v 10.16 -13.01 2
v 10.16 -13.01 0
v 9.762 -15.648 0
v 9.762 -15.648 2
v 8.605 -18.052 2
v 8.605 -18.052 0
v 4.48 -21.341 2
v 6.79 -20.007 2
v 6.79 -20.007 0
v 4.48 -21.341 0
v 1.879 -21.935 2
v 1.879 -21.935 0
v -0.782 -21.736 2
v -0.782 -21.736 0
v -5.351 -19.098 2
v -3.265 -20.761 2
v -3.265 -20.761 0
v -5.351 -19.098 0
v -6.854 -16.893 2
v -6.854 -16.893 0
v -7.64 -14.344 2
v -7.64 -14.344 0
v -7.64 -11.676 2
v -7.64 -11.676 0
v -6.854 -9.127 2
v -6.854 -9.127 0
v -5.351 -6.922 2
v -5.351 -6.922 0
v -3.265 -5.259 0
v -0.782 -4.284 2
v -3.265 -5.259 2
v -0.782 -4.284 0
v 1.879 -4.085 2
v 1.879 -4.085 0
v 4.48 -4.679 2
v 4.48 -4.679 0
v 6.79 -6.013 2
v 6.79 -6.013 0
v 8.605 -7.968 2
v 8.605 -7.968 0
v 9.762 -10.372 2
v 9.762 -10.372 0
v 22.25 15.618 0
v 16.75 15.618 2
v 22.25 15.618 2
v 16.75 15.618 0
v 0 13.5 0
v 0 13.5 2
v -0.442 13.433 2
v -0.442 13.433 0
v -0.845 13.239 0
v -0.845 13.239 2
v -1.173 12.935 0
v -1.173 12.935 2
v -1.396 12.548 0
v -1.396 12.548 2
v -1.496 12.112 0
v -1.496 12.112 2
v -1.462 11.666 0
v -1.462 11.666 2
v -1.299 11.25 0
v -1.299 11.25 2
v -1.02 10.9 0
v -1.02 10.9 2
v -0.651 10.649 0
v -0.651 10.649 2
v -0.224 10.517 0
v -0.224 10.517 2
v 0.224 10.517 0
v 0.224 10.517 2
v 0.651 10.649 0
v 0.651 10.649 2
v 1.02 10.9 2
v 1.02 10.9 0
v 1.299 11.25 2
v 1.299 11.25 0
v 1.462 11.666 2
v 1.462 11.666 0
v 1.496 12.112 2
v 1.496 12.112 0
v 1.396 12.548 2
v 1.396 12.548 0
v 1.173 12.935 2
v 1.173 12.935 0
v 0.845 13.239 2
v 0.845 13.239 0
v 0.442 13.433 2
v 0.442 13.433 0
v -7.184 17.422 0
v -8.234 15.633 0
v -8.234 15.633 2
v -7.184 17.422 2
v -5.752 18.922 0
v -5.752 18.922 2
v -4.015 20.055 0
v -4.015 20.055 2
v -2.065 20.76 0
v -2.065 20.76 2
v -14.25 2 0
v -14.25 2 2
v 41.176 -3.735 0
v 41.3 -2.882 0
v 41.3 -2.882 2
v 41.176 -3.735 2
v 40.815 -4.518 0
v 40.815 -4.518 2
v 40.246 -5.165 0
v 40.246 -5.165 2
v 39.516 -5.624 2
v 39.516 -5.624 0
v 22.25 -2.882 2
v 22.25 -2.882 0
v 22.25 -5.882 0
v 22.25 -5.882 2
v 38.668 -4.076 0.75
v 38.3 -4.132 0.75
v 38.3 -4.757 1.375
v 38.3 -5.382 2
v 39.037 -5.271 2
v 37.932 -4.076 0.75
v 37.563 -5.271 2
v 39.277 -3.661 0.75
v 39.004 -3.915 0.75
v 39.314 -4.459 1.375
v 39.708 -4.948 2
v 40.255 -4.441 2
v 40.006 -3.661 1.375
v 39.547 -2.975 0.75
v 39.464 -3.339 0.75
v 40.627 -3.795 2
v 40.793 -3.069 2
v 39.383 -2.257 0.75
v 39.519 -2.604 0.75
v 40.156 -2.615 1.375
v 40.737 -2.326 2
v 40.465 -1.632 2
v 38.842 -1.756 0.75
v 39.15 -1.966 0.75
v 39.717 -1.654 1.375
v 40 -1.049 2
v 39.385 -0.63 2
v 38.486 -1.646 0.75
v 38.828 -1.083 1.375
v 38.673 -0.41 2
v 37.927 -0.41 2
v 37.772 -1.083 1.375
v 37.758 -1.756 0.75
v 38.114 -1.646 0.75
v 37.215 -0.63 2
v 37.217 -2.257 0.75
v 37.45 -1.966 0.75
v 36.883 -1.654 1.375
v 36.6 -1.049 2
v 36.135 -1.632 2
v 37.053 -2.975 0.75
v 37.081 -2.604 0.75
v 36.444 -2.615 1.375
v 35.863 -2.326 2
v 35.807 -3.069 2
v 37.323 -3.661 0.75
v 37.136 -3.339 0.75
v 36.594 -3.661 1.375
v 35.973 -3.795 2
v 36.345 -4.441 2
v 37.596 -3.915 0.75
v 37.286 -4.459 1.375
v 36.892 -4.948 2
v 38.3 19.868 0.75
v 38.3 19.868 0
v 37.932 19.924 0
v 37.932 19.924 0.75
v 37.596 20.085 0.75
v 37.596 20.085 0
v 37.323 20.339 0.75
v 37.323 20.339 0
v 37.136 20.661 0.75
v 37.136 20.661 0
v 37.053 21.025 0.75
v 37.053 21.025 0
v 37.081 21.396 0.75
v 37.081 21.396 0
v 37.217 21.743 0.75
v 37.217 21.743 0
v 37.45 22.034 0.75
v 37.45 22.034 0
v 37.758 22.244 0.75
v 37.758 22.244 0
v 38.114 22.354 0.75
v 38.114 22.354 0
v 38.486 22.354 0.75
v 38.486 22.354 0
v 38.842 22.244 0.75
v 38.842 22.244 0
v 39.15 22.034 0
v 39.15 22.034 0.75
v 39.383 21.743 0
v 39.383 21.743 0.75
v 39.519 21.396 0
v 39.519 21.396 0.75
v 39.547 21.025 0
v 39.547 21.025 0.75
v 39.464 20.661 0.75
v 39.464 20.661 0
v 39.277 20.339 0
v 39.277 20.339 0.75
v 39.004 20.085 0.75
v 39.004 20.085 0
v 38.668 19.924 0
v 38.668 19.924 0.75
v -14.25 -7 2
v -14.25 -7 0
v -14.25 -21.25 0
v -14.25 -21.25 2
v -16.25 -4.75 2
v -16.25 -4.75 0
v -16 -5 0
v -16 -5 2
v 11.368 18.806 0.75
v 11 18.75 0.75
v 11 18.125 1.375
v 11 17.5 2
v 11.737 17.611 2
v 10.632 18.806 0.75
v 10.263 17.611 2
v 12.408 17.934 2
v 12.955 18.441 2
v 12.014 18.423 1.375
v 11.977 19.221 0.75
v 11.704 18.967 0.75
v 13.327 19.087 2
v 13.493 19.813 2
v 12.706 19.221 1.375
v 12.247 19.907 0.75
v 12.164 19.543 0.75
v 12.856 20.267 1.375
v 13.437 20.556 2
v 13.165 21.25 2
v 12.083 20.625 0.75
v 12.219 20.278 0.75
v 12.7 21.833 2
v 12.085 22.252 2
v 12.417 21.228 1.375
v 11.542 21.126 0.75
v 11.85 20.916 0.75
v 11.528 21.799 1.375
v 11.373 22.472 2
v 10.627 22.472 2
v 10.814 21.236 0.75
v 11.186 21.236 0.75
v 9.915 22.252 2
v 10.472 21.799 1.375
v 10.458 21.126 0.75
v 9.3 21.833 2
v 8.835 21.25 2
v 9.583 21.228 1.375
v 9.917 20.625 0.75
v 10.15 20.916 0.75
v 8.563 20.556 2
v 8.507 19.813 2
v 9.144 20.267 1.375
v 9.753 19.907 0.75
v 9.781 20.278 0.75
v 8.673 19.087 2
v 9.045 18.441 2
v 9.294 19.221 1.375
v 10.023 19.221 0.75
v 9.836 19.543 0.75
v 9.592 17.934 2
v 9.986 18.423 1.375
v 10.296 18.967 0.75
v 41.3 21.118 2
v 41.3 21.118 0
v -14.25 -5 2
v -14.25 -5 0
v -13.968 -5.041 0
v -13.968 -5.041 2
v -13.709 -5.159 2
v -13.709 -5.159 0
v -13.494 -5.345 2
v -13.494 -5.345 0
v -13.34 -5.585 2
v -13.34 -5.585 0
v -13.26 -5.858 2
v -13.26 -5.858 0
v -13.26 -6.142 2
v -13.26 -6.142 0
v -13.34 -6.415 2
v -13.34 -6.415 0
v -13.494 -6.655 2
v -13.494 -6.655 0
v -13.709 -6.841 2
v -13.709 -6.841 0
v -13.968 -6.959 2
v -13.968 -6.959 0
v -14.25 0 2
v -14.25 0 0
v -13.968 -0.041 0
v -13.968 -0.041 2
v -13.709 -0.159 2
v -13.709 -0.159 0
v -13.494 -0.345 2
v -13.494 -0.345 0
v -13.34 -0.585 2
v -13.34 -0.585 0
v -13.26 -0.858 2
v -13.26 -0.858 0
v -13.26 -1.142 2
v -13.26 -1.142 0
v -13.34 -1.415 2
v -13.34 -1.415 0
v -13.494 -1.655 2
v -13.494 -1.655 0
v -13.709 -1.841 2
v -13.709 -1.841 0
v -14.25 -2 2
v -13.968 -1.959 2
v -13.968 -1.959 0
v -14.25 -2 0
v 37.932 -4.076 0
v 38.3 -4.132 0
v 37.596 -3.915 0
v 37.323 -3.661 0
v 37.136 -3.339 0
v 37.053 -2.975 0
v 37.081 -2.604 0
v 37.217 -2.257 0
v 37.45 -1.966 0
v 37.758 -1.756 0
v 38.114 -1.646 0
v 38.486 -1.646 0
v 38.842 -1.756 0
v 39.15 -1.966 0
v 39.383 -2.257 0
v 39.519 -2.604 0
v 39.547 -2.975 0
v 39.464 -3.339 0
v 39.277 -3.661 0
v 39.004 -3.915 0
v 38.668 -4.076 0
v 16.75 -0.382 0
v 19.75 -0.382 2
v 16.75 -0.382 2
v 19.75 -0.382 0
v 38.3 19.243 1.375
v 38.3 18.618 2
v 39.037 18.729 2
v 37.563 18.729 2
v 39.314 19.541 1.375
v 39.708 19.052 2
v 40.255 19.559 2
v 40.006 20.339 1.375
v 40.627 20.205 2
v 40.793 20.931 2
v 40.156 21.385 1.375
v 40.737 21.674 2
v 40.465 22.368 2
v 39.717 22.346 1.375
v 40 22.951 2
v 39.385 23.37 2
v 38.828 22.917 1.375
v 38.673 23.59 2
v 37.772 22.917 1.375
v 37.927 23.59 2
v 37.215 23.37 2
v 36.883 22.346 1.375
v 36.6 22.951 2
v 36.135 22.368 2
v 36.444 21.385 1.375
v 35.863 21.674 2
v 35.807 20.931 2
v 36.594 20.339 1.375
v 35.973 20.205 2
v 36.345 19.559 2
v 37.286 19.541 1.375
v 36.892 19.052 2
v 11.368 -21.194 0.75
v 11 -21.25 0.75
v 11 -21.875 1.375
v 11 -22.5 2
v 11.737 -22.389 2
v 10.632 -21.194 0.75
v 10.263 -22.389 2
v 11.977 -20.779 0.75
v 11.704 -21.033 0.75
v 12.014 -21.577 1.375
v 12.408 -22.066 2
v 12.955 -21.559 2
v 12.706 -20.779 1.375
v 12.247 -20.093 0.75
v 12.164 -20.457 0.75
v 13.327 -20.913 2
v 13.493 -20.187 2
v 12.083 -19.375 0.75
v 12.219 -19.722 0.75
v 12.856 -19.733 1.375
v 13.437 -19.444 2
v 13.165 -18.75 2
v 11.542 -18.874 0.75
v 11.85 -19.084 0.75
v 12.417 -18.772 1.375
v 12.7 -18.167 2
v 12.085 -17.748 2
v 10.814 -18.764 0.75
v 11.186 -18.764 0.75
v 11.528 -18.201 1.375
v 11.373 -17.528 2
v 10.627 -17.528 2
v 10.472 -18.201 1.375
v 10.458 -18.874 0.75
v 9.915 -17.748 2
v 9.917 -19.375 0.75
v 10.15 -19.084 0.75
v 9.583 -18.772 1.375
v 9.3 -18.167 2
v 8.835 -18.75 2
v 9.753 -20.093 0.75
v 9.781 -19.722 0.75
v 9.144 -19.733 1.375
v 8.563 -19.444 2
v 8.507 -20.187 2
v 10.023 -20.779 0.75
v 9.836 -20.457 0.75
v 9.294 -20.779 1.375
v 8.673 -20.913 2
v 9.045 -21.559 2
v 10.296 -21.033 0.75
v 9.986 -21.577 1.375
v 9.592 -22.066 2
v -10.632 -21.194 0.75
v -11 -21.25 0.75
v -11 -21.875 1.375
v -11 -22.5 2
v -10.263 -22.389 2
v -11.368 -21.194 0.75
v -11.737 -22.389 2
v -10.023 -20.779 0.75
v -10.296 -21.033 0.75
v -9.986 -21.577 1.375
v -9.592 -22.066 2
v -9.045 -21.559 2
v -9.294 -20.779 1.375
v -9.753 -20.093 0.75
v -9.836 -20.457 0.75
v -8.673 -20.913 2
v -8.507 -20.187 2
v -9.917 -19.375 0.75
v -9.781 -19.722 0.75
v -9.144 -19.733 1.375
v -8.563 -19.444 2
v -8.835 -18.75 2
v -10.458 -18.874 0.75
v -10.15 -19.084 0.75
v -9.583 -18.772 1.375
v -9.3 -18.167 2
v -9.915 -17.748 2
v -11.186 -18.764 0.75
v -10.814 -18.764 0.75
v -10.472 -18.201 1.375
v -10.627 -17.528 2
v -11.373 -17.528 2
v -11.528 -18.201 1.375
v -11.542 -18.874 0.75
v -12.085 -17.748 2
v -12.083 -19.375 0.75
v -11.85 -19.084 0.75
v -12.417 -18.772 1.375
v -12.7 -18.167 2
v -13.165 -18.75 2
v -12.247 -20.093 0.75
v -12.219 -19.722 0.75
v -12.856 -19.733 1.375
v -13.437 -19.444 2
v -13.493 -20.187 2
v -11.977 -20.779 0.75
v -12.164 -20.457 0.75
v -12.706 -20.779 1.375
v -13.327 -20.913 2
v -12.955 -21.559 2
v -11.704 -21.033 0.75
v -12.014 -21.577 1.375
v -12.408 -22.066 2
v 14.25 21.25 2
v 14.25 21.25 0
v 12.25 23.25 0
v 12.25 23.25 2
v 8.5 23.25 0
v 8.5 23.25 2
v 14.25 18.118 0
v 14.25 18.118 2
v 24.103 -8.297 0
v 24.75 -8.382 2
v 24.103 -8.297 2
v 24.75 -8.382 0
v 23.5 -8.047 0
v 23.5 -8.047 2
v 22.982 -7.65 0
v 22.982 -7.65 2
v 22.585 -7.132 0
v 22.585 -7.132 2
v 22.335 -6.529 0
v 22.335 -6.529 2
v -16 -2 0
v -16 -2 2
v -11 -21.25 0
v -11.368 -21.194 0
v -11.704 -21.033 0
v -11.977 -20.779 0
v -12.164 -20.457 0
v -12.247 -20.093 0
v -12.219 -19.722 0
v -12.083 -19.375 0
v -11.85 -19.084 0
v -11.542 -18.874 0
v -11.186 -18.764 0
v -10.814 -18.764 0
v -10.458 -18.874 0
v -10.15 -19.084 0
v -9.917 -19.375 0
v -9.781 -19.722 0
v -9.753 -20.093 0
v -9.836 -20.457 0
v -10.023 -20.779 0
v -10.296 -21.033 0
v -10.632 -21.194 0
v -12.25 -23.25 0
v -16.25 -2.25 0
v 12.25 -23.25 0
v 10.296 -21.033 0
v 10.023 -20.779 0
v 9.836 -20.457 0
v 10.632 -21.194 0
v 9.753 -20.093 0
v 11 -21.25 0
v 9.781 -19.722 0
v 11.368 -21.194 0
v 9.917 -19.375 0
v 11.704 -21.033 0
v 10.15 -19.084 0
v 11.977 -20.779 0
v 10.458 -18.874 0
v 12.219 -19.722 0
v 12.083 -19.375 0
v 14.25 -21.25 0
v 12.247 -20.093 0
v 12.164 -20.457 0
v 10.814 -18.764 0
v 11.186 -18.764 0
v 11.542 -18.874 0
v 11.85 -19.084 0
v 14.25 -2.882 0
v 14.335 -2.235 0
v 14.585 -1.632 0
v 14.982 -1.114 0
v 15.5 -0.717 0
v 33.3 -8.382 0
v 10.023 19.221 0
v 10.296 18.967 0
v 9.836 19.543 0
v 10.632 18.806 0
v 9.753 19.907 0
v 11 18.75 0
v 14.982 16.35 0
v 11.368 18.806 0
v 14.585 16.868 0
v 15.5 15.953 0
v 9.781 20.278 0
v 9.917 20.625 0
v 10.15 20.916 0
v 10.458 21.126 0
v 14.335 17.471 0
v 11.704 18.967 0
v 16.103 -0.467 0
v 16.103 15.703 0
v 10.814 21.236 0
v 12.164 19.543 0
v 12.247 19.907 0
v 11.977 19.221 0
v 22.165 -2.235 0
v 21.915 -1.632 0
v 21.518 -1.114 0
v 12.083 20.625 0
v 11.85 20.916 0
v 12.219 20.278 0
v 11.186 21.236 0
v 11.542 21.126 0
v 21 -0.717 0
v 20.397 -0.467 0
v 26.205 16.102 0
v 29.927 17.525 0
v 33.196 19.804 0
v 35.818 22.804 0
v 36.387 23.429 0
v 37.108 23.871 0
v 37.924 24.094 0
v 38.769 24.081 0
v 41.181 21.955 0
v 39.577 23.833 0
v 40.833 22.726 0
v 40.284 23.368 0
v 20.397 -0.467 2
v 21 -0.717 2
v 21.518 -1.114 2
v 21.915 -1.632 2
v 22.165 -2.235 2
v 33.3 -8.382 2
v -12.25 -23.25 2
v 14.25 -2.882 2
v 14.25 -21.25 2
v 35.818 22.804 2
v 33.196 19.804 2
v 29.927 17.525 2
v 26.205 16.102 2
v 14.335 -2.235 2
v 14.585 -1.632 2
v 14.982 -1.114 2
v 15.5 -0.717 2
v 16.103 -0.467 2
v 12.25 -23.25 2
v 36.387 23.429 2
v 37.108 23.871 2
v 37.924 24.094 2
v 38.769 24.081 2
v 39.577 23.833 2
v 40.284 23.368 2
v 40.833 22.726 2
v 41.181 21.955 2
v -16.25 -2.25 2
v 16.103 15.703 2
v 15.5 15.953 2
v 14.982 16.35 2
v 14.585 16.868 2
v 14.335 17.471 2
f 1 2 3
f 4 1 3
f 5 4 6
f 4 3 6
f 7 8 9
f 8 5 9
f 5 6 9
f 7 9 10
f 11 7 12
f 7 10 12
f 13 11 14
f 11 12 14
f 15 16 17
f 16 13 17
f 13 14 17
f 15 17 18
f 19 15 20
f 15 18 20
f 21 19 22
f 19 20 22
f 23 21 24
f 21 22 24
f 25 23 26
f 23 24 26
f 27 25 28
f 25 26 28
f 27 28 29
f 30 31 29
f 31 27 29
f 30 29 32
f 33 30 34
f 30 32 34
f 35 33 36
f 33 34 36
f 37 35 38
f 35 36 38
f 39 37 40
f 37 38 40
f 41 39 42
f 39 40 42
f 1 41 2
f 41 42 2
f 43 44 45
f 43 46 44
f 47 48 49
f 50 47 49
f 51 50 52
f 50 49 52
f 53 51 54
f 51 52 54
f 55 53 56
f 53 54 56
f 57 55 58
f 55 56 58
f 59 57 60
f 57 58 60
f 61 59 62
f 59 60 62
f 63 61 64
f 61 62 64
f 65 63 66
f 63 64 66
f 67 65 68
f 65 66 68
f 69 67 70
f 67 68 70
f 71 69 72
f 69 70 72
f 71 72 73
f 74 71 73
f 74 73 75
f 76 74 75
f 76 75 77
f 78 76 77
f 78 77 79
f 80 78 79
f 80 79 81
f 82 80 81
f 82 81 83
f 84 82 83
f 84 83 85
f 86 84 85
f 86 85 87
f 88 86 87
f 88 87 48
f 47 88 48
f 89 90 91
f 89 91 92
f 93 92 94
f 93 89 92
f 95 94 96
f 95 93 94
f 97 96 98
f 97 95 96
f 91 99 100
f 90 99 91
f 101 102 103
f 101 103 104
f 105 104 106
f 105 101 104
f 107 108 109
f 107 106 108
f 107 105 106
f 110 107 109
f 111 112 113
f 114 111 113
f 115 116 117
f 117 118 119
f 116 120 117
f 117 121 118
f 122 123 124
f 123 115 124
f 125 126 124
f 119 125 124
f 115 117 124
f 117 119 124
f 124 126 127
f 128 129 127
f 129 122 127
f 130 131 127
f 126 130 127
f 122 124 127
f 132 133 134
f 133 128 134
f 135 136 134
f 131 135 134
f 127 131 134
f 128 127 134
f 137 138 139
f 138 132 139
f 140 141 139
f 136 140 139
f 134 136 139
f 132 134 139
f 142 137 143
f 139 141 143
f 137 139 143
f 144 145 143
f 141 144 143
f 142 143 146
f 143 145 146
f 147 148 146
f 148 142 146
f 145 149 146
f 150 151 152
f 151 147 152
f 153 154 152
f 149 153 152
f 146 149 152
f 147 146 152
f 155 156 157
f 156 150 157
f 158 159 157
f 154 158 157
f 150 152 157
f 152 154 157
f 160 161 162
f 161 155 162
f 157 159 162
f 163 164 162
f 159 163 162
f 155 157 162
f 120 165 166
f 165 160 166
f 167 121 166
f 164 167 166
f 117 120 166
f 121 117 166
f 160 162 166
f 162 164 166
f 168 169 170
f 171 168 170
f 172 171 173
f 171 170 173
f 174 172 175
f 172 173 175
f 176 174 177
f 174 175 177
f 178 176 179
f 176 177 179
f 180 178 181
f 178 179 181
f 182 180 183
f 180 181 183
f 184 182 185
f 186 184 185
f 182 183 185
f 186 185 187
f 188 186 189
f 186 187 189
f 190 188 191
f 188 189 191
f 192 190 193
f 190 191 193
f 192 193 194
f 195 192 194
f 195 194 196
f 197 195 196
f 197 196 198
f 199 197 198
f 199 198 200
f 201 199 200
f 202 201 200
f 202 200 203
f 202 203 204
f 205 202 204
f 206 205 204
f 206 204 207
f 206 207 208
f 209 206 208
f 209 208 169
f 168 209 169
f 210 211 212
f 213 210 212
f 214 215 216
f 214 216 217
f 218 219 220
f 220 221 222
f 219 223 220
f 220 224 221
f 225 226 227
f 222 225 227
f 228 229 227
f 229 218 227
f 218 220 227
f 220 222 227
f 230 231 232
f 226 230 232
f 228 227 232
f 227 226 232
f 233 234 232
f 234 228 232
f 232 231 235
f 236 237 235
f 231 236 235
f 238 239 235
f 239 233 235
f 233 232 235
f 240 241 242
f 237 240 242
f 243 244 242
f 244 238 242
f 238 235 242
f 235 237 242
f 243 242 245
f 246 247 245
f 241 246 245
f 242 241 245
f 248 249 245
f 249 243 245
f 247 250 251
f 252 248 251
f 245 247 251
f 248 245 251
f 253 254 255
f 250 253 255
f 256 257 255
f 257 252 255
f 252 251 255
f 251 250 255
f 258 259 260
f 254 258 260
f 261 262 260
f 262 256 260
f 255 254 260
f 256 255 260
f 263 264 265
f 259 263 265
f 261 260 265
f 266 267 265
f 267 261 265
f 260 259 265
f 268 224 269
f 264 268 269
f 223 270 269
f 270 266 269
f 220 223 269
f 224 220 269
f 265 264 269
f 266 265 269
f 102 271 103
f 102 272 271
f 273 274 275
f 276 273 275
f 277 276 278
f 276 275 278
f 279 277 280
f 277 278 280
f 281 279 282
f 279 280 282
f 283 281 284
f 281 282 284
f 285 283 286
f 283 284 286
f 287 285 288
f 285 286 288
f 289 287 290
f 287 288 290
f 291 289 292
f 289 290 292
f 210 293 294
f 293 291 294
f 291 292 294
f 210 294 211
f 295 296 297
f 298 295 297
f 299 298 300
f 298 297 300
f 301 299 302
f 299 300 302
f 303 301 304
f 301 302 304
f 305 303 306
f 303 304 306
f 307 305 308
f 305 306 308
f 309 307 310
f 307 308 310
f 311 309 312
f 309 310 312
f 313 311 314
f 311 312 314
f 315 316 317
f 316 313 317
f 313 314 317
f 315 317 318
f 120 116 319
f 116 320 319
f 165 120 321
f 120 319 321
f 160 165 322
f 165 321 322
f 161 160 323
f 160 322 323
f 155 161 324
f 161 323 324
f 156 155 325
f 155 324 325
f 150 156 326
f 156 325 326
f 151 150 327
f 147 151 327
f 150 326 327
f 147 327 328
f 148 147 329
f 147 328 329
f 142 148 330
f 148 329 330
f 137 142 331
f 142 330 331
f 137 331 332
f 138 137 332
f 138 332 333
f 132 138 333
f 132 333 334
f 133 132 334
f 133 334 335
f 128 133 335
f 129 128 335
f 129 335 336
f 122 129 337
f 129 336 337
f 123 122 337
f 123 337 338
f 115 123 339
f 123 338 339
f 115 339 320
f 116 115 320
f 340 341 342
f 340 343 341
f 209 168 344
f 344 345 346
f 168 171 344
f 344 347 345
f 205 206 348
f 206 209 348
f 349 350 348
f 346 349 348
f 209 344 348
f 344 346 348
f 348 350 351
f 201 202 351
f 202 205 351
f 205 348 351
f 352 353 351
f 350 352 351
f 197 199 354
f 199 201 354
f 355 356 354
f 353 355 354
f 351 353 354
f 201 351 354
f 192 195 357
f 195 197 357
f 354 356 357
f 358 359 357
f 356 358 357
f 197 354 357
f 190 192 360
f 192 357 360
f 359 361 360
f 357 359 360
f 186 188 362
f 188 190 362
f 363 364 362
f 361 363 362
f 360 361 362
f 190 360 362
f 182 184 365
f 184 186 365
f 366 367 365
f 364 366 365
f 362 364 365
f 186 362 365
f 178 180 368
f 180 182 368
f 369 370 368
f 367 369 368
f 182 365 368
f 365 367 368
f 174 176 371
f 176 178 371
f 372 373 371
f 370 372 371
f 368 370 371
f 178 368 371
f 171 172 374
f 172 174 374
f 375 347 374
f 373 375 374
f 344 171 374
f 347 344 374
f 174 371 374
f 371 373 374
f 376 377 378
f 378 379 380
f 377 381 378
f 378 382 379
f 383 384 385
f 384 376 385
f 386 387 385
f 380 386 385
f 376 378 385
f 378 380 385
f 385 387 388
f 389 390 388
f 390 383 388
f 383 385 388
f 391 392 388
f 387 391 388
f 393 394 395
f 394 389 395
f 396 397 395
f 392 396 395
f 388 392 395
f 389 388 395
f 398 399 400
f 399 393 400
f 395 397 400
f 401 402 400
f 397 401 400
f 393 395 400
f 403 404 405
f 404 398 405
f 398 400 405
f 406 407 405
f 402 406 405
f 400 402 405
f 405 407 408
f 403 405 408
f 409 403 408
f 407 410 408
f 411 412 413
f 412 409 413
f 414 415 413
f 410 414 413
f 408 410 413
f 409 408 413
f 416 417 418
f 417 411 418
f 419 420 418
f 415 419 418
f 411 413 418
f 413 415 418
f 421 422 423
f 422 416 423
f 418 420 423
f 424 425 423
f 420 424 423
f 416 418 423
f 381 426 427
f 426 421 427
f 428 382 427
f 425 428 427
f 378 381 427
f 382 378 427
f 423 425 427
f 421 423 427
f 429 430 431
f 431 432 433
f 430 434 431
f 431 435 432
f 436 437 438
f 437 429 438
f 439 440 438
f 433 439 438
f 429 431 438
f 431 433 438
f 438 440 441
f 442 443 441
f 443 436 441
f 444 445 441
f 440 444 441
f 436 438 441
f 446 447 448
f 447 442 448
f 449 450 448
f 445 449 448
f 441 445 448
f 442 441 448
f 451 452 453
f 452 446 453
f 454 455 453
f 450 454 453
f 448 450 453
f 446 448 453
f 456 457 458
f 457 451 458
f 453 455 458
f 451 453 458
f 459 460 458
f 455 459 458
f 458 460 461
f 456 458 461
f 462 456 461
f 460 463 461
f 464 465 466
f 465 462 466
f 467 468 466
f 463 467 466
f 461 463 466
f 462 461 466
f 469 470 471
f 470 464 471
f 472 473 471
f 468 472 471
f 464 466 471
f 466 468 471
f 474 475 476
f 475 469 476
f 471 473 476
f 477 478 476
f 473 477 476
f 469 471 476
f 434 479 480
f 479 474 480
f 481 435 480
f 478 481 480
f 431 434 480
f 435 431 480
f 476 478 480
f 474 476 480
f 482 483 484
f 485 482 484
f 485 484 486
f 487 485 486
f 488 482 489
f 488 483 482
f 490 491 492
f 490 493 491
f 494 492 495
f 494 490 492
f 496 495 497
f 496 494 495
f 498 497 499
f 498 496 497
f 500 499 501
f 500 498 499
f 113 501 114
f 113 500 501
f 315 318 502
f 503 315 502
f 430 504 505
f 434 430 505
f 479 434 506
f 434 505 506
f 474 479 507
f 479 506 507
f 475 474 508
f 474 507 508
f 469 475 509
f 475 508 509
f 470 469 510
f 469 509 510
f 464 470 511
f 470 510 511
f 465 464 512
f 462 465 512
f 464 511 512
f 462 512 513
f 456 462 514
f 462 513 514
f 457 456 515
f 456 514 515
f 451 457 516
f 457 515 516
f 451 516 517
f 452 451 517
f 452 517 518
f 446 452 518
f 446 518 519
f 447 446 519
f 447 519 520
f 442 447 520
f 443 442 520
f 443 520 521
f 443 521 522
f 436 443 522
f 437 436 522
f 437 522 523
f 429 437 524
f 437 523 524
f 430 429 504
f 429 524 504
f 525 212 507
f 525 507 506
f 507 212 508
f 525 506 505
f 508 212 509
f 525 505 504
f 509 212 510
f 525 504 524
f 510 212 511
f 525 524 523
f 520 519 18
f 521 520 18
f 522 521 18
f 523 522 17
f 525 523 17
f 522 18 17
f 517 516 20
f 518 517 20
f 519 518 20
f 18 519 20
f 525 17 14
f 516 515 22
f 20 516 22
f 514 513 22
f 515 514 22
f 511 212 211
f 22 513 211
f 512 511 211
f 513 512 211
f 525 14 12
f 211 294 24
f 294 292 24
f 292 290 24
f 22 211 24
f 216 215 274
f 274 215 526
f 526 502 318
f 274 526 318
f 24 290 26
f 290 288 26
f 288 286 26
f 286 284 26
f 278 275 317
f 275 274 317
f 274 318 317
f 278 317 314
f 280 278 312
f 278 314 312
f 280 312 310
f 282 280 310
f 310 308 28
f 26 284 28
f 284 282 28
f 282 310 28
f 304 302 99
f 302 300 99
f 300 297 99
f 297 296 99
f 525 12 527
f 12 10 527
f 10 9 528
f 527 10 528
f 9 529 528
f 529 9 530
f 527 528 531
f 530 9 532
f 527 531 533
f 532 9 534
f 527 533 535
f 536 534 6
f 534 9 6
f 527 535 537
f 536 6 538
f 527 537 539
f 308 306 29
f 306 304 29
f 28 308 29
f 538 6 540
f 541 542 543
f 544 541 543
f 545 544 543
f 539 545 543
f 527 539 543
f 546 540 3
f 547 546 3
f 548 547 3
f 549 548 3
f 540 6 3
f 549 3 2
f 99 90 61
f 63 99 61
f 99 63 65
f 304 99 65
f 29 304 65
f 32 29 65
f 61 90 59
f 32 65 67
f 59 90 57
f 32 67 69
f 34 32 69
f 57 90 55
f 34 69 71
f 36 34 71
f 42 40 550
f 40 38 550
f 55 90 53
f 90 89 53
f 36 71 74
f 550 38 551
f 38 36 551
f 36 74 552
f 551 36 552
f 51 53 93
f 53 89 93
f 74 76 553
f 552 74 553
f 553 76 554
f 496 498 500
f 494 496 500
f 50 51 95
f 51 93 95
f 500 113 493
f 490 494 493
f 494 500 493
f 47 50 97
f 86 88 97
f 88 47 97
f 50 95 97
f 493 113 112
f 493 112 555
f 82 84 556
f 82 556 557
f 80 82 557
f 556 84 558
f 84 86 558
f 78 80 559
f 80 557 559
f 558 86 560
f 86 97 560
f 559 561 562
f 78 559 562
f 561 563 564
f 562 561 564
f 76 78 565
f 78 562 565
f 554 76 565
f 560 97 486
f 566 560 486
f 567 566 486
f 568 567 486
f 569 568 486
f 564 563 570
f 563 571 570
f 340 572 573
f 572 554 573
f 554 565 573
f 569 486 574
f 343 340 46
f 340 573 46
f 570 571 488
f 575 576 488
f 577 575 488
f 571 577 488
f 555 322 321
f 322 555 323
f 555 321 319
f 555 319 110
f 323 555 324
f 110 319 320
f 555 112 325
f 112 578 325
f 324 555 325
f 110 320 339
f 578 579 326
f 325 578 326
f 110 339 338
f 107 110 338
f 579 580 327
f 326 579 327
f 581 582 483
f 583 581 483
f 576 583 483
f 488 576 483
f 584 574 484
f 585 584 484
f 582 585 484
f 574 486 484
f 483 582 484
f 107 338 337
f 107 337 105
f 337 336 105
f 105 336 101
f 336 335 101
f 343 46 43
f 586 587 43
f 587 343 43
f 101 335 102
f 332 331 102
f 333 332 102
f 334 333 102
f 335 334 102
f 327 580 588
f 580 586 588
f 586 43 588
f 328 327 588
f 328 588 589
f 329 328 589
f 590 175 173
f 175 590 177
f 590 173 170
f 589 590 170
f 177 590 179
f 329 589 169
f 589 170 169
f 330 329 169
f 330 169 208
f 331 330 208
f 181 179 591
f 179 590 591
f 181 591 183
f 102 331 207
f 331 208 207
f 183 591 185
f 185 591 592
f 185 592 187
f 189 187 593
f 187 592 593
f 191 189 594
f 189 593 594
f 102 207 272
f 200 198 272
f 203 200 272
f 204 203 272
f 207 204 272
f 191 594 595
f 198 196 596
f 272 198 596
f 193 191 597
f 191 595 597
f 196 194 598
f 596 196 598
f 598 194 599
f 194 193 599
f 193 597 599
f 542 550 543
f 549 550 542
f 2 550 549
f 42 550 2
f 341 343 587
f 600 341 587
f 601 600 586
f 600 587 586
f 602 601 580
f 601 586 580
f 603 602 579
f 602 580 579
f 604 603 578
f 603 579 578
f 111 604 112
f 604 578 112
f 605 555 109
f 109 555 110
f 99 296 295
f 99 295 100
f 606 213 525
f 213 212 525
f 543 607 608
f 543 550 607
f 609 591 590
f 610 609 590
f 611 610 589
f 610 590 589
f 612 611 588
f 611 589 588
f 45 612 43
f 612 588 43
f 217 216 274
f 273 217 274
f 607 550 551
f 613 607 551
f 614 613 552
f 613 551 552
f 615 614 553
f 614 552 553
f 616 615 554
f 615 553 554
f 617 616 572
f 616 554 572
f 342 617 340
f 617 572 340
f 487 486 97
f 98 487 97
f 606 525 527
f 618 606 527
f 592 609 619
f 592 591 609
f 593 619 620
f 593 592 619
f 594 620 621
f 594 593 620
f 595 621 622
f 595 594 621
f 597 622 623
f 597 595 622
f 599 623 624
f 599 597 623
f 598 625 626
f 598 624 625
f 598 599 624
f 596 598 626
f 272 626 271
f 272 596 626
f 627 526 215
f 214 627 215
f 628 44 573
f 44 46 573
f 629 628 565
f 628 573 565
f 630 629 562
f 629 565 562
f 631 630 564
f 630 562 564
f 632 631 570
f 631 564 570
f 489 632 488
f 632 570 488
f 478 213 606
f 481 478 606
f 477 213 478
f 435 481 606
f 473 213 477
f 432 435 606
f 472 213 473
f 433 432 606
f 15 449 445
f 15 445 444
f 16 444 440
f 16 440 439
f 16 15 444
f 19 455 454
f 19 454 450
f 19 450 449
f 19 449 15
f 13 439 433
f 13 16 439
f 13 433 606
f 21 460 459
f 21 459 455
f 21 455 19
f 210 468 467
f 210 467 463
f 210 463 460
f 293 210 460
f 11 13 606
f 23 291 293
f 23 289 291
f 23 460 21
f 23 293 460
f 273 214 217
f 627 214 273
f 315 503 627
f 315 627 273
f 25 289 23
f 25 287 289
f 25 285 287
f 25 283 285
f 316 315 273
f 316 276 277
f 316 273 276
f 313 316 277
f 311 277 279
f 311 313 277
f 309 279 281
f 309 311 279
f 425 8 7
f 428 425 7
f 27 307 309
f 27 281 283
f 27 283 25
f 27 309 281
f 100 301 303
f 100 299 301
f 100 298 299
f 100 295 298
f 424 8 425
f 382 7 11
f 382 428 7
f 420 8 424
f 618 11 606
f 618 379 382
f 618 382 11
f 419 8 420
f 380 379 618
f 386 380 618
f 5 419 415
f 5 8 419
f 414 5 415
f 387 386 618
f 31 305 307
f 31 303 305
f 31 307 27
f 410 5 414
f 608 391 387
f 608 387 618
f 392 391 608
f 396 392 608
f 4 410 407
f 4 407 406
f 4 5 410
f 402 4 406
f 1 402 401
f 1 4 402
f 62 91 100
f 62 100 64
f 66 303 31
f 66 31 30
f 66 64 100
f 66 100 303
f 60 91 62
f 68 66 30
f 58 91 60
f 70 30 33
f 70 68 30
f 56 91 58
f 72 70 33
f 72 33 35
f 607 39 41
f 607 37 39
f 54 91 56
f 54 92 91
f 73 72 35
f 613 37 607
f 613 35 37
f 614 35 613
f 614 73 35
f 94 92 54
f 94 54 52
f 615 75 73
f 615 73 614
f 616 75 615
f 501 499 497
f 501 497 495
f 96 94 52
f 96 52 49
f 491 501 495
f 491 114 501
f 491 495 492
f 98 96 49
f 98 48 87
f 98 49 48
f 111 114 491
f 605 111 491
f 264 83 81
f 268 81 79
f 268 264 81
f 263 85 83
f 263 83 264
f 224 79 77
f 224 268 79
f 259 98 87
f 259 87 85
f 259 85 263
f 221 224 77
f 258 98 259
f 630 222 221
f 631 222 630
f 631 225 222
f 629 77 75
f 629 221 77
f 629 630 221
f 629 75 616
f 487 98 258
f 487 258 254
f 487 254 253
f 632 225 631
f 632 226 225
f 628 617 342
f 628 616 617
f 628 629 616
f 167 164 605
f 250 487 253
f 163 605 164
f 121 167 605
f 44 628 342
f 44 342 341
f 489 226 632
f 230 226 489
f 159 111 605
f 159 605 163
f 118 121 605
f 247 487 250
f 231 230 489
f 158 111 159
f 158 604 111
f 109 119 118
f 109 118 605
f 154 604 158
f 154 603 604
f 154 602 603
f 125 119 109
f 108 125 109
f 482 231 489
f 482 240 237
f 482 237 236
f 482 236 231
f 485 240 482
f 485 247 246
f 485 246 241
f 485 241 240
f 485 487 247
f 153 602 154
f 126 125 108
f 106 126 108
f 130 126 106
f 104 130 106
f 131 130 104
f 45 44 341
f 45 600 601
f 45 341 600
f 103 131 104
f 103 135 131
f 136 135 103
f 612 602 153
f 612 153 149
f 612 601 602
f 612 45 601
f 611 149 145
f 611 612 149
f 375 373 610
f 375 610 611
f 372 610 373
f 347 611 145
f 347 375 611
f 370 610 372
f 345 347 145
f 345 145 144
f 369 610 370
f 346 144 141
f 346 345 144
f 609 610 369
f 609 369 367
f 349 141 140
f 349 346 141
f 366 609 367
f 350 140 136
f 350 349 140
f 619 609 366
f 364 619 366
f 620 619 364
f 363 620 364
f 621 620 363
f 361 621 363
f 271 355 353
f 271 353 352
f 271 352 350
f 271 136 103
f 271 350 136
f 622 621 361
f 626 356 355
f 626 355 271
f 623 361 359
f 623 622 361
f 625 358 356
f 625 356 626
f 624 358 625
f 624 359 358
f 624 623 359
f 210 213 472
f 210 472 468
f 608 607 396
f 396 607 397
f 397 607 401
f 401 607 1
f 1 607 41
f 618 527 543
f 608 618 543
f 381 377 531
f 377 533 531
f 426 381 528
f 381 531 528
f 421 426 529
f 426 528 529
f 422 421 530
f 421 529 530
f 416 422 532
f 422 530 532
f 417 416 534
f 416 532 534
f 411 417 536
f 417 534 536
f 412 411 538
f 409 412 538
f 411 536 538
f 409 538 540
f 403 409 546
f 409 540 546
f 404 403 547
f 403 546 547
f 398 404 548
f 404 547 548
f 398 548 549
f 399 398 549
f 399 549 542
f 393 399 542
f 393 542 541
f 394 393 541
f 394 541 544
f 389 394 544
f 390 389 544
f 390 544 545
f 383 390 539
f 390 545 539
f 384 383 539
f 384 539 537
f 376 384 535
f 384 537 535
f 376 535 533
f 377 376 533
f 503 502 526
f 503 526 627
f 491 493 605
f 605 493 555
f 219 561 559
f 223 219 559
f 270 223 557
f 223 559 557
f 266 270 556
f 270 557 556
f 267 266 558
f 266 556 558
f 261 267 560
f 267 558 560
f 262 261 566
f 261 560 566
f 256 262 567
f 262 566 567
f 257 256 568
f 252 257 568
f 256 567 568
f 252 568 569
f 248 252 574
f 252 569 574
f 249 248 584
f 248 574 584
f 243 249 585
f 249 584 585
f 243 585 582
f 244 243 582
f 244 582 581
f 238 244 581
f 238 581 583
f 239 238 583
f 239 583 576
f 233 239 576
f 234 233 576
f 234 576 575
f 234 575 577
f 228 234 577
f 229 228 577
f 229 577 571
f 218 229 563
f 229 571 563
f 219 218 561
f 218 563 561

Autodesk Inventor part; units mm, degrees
ref_plane "YZ Plane" through (0, 0, 0) normal (1, 0, 0) x (0, 1, 0)
ref_plane "XZ Plane" through (0, 0, 0) normal (0, 1, 0) x (-1, 0, 0)
ref_plane "XY Plane" through (0, 0, 0) normal (0, 0, 1) x (1, 0, 0)
sketch "スケッチ1" plane through (0, 0, 0) normal (0, 0, 1) x (1, 0, 0)
  circle A0 centre (11, -20) radius 1.25 construction
  circle A1 centre (11, 20) radius 1.25 construction
  circle A2 centre (-11, -20) radius 1.25 construction
  arc A3 (8.5, 20) -> (11, 17.5) centre (11, 20) ccw construction
  line L0 (11, 17.5) -> (12.15, 17.5) construction
  arc A4 (13.15, 16.5) -> (12.15, 17.5) centre (12.15, 16.5) ccw construction
  line L1 (13.15, 16.5) -> (13.15, -16.5) construction
  arc A5 (12.15, -17.5) -> (13.15, -16.5) centre (12.15, -16.5) ccw construction
  line L2 (12.15, -17.5) -> (11, -17.5) construction
  arc A6 (11, -17.5) -> (8.5, -20) centre (11, -20) ccw construction
  line L3 (8.5, -20) -> (8.5, -21.15) construction
  arc A7 (7.5, -22.15) -> (8.5, -21.15) centre (7.5, -21.15) ccw construction
  line L4 (7.5, -22.15) -> (-7.5, -22.15) construction
  arc A8 (-8.5, -21.15) -> (-7.5, -22.15) centre (-7.5, -21.15) ccw construction
  line L5 (-8.5, -21.15) -> (-8.5, -20) construction
  arc A9 (-8.5, -20) -> (-11, -17.5) centre (-11, -20) ccw construction
  line L6 (-11, -17.5) -> (-14, -17.5) construction
  line L7 (8.5, 23) -> (8.5, 20) construction
  line L8 (-14.25, -17.75) -> (-14.25, -21.25) construction
  line L9 (-14.25, -21.25) -> (-12.25, -23.25) projected
  line L10 (-12.25, -23.25) -> (12.25, -23.25) projected
  line L11 (12.25, -23.25) -> (14.25, -21.25) projected
  line L12 (14.25, -21.25) -> (14.25, 21.25) construction
  line L13 (14.25, 21.25) -> (12.25, 23.25) projected
  line L14 (12.25, 23.25) -> (8.75, 23.25) construction
  line L15 (16.75, 15.618) -> (22.25, 15.618)
  line L16 (41.3, 21.118) -> (41.3, -2.882)
  line L17 (19.75, -0.382) -> (16.75, -0.382)
  arc A10 (41.3, 21.118) -> (35.8184, 22.8038) centre (38.3, 21.118) ccw
  arc A11 (39.5165, -5.6243) -> (41.3, -2.882) centre (38.3, -2.882) ccw
  circle A12 centre (38.3, 21.118) radius 1.25 construction
  circle A13 centre (38.3, -2.882) radius 1.25 construction
  line L18 (14.25, 21.25) -> (14.25, 18.118)
  line L19 (14.25, -2.882) -> (14.25, -21.25)
  arc A14 (14.25, 18.118) -> (16.75, 15.618) centre (16.75, 18.118) ccw
  arc A15 (16.75, -0.382) -> (14.25, -2.882) centre (16.75, -2.882) ccw
  line L20 (72.306, -6.882) -> (-28.676, -6.882) construction
  circle A16 centre (1.21, -13.01) radius 8.7 construction
  circle A17 centre (1.21, -13.01) radius 8.95
  arc A18 (22.25, 15.618) -> (35.8184, 22.8038) centre (22.25, 32.0211) ccw
  line L21 (22.25, 32.0211) -> (22.25, -5.382) construction
  line L22 (22.25, -2.882) -> (22.25, -5.882)
  line L23 (24.75, -8.382) -> (33.3, -8.382)
  line L24 (33.3, -8.382) -> (39.5165, -5.6243)
  arc A19 (22.25, -2.882) -> (19.75, -0.382) centre (19.75, -2.882) ccw
  arc A20 (22.25, -5.882) -> (24.75, -8.382) centre (24.75, -5.882) ccw
  circle A21 centre (0, 12) radius 1.25 construction
  line L25 (12.25, 23.25) -> (8.5, 23.25)
  line L26 (8.5, 23.25) -> (-2.0647, 20.76)
  arc A22 (-2.0647, 20.76) -> (-8.234, 15.6334) centre (0, 12) ccw
  line L27 (0, 0) -> (0, -31.805) construction
  line L28 (-12.15, -17.5) -> (-14.25, -17.5) construction
  line L29 (8.5, 23.25) -> (8.5, 21.15) construction
  line L30 (8.75, 23.25) -> (8.5, 23) projected
  line L31 (-14, -17.5) -> (-14.25, -17.75) construction
  line L32 (-14.25, 0) -> (-14.25, -2) construction
  line L33 (-14.25, -2) -> (-16.25, -2)
  line L34 (-16.25, -2) -> (-16.25, -5)
  line L35 (-16.25, -5) -> (-14.25, -5)
  line L36 (-14.25, -5) -> (-14.25, -7) construction
  line L37 (-14.25, 0) -> (-14.25, 2)
  line L38 (-14.25, 2) -> (-8.234, 15.6334)
  arc A23 (-14.25, -2) -> (-14.25, 0) centre (-14.25, -1) ccw
  arc A24 (-14.25, -7) -> (-14.25, -5) centre (-14.25, -6) ccw
  line L39 (-14.25, -7) -> (-14.25, -21.25)
  point P0 (11, 20)
  point P1 (11, -20)
  point P2 (-11, -20)
  point P3 (14.25, 15.618)
  point P4 (23.6679, 15.618)
  point P5 (23.161, -0.382)
  point P6 (14.25, -0.382)
  point P7 (22.25, -0.382)
  dimension "d0" = 3
  dimension "d1" = 2.5
  dimension "d2" = 6.5
  dimension "d3" = 0.25
  dimension "d7" = 16
  dimension "d8" = 8
  dimension "d16" = 8
  dimension "d17" = 5
  dimension "d26" = 9
  dimension "d34" = 1
  dimension "d35" = 3
  dimension "d36" = 2
  dimension "d37" = 10
  dimension "d38" = 2
extrude "押し出し1" add sketch "スケッチ1" along normal blind 2
sketch "スケッチ2" plane through (0, 0, 2) normal (0, 0, 1) x (1, 0, 0)
  point P0 (0, 0)
  point P1 (38.3, 21.118)
  point P2 (38.3, -2.882)
  point P3 (-11, 20)
  point P4 (11, 20)
  point P5 (11, -20)
  point P6 (-11, -20)
hole "穴2" at (38.3, 21.118, 2) at (38.3, -2.882, 2) at (-11, 20, 2) at (11, 20, 2) at (11, -20, 2) at (-11, -20, 2) direction (0, 0, -1) diameter 2.5 end through all countersink diameter 5 countersink angle 90
hole "穴3" at (0, 12, 0) direction (0, 0, 1) diameter 3 end through all
chamfer "面取り1" distance 0.25 angle 45 2 edges at (-16.25, -2, 1) (-16.25, -5, 1)
properties part number "COXA_YAW_ROLL_ADPT_TOP_BASE"
